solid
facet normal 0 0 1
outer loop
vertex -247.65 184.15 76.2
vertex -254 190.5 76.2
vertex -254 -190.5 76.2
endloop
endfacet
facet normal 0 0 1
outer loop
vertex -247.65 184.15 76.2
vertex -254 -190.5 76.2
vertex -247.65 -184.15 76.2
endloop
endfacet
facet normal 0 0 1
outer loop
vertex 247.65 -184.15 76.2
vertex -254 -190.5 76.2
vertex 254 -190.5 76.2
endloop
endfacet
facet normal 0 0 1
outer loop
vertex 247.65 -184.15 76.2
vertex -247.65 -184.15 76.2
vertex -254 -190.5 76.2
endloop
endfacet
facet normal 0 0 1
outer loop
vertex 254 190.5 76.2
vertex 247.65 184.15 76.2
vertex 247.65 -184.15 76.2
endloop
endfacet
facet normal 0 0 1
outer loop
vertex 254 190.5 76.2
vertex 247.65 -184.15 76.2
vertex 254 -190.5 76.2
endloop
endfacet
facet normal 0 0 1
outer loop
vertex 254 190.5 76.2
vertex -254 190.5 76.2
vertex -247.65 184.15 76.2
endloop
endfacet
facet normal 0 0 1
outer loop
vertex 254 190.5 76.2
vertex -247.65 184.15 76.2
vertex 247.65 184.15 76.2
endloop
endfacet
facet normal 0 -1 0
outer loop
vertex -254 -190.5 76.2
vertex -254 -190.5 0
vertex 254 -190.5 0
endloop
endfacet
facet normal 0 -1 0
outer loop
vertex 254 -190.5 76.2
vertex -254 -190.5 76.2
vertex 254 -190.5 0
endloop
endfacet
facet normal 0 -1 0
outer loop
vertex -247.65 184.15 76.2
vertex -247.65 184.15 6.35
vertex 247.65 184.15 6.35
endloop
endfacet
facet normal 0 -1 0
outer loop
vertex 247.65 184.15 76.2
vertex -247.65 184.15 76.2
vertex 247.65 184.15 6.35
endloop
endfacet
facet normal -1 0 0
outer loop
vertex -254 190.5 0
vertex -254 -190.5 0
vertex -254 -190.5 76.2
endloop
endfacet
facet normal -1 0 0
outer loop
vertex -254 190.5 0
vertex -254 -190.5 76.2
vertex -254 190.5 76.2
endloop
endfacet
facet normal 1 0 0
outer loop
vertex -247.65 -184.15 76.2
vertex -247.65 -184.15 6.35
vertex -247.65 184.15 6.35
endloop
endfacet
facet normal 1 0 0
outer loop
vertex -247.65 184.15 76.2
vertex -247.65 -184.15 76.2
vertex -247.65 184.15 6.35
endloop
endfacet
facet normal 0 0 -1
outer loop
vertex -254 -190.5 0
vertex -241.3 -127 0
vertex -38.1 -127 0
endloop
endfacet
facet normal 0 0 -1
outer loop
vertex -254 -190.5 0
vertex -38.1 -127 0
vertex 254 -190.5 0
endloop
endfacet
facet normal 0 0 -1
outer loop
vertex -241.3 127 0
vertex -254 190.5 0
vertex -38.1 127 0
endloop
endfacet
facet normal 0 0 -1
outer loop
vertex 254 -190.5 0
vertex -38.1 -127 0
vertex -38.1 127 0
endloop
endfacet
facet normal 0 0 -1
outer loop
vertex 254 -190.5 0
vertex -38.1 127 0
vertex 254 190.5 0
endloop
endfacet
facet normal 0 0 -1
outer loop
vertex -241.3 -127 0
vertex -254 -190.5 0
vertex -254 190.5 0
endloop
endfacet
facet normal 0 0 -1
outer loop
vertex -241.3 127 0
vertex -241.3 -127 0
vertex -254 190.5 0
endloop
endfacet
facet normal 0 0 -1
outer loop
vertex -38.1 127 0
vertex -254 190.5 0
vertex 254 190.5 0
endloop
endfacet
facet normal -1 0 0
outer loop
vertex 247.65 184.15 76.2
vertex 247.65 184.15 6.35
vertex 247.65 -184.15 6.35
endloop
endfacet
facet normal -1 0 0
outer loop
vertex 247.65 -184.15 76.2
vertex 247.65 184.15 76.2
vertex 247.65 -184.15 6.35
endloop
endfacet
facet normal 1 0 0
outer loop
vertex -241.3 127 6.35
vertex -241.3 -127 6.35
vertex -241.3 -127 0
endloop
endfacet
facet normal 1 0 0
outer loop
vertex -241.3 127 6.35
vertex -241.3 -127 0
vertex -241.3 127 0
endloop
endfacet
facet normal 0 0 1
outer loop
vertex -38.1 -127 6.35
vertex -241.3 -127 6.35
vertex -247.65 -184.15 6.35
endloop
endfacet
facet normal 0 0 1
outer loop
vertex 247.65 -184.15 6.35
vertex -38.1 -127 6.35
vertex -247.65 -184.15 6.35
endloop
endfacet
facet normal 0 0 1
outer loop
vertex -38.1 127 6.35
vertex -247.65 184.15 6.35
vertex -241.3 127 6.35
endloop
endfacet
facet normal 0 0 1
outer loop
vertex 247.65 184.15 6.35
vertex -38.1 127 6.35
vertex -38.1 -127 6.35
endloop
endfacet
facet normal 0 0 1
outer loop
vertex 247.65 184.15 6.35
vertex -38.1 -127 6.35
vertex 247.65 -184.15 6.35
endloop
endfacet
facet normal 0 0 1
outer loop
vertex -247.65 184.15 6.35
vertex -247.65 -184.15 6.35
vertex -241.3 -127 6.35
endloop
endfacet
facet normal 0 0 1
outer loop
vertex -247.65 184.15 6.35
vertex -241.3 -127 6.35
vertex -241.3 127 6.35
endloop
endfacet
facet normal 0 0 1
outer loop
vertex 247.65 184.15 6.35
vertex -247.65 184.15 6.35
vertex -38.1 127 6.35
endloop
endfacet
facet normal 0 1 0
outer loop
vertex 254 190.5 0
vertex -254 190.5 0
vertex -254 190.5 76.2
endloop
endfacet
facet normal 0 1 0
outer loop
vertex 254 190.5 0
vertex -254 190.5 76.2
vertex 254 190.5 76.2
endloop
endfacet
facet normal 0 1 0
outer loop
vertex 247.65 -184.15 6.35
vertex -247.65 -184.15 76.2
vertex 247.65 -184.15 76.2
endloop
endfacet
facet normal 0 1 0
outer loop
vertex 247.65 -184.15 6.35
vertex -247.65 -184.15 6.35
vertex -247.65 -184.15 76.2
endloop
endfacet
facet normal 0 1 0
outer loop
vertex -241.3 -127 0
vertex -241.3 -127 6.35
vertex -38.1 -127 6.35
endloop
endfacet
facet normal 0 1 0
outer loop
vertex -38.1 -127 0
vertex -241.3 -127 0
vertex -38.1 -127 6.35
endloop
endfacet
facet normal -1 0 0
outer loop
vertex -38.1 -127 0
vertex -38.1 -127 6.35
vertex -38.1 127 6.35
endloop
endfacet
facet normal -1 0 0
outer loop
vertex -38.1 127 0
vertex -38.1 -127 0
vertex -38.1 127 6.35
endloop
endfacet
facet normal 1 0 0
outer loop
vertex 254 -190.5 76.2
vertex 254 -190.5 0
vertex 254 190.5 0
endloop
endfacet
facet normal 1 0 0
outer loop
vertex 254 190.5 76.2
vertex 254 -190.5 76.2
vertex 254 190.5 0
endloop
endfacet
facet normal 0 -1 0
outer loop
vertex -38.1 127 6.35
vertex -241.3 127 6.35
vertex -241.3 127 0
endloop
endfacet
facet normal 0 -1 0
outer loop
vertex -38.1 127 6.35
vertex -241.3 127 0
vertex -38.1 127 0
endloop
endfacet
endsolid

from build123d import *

# Parameters (mm, degrees)
F0_W     = 508
F0_H     = 381
F1_DEPTH = 76.2
F2_W     = 203.2
F2_H     = 254
F3_DEPTH = 76.2
F4_T     = -6.35
F5_W     = 215.9
F5_H     = 266.7
F5_W_2   = 203.2
F5_H_2   = 254
F6_DEPTH = 69.85


# Not quite as in the source:
# - a shell that OpenCascade refuses in one call is made with other operations: the cavity is built on its own and cut out


with BuildPart() as f1:
    # F0 (on Top) → F1 (new body)
    with BuildSketch(Plane.XY):
        Rectangle(F0_W, F0_H)
    extrude(amount=F1_DEPTH)

    # F2 (on face) → F3 (cut, through all)
    with BuildSketch(Plane.XY.offset(76.2)):
        with Locations((-139.7, 0)):
            Rectangle(F2_W, F2_H)
    extrude(amount=-F3_DEPTH, mode=Mode.SUBTRACT)

    # F4: a shell. OpenCascade refuses it in one call, so the cavity is built on its own and cut out:
    # the body offset inwards by the wall thickness, plus a prism from it out through each open face.
    f4_core = offset(f1.part, amount=F4_T, kind=Kind.INTERSECTION, mode=Mode.PRIVATE)
    f4_exits = [f4_core.faces().sort_by_distance(p)[0] for p in [
        (64.435271, 0, 69.85),
    ]]
    add(f4_core, mode=Mode.SUBTRACT)
    extrude(f4_exits, amount=-F4_T, mode=Mode.SUBTRACT)

    # F5 (on face) → F6 (cut)
    with BuildSketch(Plane.XY.offset(76.2)):
        with Locations((-139.7, 0)):
            Rectangle(F5_W, F5_H)
        with Locations((-139.7, 0)):
            Rectangle(F5_W_2, F5_H_2, mode=Mode.SUBTRACT)
    extrude(amount=-F6_DEPTH, mode=Mode.SUBTRACT)


solid = f1.part
